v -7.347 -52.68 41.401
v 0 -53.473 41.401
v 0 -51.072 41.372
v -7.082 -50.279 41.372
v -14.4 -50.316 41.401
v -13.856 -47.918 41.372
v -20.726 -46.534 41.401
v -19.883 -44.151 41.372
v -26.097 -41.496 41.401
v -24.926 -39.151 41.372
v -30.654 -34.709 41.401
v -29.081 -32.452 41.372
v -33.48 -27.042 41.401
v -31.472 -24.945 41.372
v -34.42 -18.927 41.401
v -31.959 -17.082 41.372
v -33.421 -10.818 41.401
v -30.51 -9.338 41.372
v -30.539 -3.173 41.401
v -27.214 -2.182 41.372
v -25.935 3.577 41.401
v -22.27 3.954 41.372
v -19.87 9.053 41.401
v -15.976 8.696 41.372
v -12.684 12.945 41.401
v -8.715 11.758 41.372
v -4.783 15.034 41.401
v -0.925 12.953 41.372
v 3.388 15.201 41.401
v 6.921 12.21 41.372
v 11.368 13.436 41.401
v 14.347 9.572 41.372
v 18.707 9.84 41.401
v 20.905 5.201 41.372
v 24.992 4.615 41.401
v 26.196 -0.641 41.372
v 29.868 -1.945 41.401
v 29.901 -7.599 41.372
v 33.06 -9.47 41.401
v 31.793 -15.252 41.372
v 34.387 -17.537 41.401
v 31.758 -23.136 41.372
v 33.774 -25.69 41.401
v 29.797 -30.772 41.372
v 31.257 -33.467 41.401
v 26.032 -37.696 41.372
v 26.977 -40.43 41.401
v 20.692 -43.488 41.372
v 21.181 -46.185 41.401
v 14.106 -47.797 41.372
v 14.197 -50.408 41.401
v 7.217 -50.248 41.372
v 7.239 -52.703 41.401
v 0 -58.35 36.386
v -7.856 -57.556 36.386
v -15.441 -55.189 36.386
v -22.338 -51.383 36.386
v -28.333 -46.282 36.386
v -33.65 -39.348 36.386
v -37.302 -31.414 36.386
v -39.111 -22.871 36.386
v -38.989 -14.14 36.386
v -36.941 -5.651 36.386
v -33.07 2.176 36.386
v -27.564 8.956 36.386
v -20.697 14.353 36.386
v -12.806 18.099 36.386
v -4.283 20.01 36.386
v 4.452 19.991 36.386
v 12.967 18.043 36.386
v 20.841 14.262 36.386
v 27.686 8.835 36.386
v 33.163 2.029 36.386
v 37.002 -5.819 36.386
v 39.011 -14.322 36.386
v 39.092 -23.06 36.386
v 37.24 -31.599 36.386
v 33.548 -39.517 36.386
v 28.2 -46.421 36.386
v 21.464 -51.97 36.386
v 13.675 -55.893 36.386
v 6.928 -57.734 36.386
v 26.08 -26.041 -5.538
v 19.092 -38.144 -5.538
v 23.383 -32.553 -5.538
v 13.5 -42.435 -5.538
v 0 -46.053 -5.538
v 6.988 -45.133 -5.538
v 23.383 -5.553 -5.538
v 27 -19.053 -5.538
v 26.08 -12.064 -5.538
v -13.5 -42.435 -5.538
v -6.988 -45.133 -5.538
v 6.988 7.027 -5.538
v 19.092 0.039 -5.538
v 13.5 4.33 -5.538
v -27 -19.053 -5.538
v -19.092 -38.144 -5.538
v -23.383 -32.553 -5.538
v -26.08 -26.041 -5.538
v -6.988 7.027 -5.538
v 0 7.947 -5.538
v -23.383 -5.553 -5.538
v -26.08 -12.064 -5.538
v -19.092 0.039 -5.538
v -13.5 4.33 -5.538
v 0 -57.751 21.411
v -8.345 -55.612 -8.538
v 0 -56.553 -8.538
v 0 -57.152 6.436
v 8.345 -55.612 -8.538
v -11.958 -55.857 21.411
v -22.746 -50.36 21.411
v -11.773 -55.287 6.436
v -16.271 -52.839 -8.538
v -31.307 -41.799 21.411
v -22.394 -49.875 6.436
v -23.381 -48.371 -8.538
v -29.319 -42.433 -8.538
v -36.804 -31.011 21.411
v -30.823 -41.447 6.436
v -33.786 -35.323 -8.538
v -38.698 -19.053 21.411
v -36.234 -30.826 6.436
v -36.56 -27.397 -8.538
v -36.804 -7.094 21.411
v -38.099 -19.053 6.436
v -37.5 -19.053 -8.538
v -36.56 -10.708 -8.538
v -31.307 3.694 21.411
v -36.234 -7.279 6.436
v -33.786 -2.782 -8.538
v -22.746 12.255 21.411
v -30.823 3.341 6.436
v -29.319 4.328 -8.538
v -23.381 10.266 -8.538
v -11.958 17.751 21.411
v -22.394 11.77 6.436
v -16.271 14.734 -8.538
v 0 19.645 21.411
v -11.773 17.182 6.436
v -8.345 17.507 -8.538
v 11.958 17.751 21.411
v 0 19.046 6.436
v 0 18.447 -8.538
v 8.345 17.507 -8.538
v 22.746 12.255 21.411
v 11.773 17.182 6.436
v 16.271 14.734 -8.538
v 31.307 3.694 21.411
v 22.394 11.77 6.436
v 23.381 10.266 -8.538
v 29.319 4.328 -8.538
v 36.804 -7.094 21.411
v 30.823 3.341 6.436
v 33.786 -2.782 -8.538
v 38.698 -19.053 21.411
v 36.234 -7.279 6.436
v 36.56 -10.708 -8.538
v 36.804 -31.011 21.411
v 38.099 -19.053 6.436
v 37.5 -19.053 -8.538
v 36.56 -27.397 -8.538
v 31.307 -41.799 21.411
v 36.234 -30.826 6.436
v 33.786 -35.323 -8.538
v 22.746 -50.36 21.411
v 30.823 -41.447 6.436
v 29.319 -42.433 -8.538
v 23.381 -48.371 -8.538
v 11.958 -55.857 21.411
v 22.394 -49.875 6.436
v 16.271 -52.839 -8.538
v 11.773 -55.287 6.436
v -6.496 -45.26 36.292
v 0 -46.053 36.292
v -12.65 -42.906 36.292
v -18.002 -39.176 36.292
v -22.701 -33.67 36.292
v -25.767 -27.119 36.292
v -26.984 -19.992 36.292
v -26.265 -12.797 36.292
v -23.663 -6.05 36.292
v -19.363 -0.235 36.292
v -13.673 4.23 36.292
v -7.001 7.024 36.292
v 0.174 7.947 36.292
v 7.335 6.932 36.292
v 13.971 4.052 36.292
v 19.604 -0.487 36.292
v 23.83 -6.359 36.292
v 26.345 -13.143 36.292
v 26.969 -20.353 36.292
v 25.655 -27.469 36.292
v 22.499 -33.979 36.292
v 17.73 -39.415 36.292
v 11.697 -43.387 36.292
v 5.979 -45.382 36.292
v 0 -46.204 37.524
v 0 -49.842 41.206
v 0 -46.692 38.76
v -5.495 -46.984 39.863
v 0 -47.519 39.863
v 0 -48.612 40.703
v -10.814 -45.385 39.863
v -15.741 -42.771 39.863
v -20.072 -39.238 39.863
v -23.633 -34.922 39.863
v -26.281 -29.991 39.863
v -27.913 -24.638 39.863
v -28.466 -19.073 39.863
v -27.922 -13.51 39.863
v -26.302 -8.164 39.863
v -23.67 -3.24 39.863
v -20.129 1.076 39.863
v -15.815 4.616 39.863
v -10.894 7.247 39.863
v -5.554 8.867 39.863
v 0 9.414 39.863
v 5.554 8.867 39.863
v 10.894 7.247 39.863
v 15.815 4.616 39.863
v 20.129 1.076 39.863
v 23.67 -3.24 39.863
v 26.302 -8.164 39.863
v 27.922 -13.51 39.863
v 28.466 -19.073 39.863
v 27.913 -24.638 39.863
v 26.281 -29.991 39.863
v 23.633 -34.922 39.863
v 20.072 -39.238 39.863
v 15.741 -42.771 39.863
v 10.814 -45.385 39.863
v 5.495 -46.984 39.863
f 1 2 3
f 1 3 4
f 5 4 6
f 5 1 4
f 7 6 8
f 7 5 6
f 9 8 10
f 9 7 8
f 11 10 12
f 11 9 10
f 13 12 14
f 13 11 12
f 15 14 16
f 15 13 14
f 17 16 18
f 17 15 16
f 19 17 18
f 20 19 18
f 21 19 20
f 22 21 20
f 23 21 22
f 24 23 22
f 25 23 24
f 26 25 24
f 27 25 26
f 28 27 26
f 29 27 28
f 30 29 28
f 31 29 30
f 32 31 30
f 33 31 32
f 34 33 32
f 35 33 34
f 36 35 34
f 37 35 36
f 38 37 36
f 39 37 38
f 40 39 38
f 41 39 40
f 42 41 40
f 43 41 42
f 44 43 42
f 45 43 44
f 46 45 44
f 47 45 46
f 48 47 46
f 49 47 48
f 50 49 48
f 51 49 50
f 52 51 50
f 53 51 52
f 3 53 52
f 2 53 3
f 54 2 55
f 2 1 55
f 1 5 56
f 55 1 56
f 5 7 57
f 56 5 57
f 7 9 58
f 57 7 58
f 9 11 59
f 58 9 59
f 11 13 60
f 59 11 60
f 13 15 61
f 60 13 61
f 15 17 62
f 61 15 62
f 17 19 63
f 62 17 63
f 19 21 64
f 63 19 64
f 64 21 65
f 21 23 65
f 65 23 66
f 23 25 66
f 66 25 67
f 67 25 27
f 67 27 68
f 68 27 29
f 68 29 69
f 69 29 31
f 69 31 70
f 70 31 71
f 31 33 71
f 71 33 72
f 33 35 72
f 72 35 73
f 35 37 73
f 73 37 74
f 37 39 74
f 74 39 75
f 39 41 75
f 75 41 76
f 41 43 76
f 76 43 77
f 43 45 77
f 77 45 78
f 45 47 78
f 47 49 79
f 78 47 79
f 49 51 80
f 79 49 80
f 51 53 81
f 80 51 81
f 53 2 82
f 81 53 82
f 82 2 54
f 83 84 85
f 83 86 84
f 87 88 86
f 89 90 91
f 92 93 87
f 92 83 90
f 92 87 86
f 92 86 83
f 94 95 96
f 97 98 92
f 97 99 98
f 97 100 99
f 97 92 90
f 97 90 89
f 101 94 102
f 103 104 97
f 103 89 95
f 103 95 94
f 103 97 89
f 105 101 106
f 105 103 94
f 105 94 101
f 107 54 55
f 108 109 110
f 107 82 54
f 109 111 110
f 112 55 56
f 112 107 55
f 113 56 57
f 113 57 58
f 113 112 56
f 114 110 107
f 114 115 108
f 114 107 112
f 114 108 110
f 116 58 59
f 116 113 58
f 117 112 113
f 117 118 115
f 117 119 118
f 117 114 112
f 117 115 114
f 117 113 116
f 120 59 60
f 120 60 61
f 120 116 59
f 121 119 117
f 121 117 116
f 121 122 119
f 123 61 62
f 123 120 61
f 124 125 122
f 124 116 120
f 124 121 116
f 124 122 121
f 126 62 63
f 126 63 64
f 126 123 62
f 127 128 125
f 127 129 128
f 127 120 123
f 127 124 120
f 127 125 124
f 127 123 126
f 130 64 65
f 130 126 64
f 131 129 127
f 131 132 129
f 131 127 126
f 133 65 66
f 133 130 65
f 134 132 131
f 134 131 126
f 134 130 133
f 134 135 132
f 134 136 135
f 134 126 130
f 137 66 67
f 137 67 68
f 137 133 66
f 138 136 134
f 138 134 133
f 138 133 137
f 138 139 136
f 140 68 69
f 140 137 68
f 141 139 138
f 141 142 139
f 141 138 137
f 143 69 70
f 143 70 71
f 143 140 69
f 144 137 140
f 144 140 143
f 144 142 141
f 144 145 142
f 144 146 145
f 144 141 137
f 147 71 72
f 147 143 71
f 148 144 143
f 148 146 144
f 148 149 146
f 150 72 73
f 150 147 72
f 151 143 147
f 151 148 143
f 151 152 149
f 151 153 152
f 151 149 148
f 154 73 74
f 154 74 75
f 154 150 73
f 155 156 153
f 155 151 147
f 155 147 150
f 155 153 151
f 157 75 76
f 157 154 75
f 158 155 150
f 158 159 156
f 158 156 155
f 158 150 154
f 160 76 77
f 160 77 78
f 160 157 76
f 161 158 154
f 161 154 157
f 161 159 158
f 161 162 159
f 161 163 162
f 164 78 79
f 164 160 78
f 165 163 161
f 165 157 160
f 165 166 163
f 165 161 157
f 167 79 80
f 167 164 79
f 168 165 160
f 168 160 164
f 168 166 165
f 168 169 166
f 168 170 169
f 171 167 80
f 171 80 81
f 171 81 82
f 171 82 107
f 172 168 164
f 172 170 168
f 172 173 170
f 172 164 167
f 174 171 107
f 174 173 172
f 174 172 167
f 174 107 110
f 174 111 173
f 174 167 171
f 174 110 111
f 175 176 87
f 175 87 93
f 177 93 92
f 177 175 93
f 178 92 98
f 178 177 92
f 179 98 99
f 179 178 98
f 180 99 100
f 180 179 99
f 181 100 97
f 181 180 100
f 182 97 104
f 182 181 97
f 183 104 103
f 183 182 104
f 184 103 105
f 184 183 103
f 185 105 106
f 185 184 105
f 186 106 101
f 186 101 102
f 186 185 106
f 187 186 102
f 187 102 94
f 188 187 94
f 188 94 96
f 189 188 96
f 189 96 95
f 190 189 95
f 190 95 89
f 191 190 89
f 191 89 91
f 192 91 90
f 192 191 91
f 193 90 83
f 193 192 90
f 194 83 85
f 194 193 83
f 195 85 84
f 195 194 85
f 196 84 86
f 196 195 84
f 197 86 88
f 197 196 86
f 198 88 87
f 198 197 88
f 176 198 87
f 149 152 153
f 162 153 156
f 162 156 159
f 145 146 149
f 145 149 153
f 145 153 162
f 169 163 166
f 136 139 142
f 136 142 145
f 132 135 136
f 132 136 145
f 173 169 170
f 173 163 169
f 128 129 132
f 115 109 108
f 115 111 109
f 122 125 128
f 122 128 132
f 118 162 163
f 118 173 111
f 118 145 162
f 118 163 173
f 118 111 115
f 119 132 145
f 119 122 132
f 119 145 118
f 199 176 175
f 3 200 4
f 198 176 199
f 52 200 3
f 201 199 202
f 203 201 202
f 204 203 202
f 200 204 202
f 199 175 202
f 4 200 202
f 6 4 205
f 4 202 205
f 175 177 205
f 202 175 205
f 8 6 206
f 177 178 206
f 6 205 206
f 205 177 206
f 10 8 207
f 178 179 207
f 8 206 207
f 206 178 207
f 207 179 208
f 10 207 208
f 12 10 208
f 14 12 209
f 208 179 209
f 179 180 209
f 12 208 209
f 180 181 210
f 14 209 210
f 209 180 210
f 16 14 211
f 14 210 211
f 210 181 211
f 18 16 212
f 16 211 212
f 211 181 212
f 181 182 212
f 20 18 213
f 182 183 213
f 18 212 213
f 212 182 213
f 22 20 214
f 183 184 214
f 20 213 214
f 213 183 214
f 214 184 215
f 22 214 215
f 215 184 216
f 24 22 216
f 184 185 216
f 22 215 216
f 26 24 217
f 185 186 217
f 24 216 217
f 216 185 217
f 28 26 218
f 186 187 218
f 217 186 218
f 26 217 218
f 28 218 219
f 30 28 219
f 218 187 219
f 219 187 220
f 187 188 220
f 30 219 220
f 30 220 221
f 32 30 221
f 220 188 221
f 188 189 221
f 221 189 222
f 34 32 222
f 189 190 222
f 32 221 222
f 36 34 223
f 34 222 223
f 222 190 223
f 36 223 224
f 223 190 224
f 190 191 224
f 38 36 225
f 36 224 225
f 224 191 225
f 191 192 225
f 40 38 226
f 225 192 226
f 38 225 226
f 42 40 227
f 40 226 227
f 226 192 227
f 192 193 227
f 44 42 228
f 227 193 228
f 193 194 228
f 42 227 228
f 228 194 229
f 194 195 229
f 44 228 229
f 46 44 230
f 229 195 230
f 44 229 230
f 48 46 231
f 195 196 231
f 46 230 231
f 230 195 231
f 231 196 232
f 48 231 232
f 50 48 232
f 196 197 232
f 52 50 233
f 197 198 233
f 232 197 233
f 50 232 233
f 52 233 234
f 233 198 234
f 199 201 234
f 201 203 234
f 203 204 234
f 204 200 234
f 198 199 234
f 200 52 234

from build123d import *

# Parameters (mm, degrees)
F2_R    = 5.08
F3_SIZE = 5.08


with BuildPart() as f1:
    # F0 (on Right) → F1 (revolve)
    with BuildSketch(Plane.YZ):
        Polygon((-46.0525572707, -5.5384264588), (-46.0525572707, 41.3120244363), (-58.5525572707, 41.4615735412), (-56.5525572707, -8.5384264588), (-19.0525572707, -8.5384264588), (-19.0525572707, -5.5384264588), align=None)
    revolve(axis=Axis((0, -19.0525572707, -7.0384264588), (0, 0, -1)))

    # F2
    f2_edges = [f1.edges().sort_by_distance(p)[0] for p in [
        (0, 7.947443, 41.312024),
    ]]
    fillet(f2_edges, radius=F2_R)

    # F3
    f3_edges = [f1.edges().sort_by_distance(p)[0] for p in [
        (0, 20.447443, 41.461574),
    ]]
    chamfer(f3_edges, length=F3_SIZE)


solid = f1.part
